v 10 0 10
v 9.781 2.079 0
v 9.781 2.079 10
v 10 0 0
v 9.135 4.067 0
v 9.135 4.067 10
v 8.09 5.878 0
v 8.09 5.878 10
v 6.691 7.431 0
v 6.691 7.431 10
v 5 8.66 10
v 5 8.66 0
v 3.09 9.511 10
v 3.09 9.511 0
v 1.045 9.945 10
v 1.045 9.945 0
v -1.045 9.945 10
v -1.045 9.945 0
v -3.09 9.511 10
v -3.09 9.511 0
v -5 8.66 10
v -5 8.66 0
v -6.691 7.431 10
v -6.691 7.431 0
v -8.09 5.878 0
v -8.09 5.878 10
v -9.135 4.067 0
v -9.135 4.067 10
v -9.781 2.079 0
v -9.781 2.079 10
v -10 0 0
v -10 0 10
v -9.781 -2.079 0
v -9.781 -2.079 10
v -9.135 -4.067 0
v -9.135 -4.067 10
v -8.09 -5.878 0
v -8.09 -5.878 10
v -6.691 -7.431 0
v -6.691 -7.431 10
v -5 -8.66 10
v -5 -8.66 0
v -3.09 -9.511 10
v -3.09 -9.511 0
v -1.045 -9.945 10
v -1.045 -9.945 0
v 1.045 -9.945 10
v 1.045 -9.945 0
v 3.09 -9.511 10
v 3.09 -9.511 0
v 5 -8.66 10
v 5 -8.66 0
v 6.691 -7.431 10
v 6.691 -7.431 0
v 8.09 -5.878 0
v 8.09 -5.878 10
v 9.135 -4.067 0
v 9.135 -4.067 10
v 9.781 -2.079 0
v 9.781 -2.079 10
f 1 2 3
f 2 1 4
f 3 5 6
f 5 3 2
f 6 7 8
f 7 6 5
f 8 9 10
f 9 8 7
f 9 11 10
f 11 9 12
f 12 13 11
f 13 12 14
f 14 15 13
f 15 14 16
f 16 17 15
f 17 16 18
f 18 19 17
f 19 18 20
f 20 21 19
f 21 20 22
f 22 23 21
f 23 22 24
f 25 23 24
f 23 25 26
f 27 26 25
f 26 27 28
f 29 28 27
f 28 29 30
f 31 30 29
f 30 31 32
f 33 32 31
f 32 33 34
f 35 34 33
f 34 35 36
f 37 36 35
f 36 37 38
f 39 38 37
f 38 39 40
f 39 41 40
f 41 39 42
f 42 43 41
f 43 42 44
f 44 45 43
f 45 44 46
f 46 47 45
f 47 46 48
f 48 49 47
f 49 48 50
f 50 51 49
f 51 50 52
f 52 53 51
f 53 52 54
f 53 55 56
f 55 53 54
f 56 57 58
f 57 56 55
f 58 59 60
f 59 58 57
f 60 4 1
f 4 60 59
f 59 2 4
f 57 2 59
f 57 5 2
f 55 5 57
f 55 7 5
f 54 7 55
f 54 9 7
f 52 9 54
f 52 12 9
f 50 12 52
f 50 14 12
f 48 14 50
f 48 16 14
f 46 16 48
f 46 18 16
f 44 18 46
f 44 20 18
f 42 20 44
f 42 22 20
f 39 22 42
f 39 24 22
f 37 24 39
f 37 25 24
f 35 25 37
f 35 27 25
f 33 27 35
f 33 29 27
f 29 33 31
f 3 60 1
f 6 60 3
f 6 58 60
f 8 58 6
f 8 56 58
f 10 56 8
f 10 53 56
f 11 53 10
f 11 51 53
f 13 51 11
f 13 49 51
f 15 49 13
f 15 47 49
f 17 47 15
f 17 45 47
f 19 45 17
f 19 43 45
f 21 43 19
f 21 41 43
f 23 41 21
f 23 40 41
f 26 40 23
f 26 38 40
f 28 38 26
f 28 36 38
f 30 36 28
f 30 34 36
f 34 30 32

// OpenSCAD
// file: ../models/eye.scad
//:Model eye_outside [1,1,1]
module eye_outside()
{
    color([255,255,255])
    cylinder(r=8, h=2);
}

//:Model eye_inside [0,0,0]
module eye_inside()
{
    color([0,0,0])
    cylinder(r=3, h=3);
}

module eye()
{
 eye_outside();
 eye_inside();   
}

eye();
// main file
use <../models/eye.scad>;

//:Component Debug
module debug()
{
    cylinder(r=10, h=10);
}

debug();
